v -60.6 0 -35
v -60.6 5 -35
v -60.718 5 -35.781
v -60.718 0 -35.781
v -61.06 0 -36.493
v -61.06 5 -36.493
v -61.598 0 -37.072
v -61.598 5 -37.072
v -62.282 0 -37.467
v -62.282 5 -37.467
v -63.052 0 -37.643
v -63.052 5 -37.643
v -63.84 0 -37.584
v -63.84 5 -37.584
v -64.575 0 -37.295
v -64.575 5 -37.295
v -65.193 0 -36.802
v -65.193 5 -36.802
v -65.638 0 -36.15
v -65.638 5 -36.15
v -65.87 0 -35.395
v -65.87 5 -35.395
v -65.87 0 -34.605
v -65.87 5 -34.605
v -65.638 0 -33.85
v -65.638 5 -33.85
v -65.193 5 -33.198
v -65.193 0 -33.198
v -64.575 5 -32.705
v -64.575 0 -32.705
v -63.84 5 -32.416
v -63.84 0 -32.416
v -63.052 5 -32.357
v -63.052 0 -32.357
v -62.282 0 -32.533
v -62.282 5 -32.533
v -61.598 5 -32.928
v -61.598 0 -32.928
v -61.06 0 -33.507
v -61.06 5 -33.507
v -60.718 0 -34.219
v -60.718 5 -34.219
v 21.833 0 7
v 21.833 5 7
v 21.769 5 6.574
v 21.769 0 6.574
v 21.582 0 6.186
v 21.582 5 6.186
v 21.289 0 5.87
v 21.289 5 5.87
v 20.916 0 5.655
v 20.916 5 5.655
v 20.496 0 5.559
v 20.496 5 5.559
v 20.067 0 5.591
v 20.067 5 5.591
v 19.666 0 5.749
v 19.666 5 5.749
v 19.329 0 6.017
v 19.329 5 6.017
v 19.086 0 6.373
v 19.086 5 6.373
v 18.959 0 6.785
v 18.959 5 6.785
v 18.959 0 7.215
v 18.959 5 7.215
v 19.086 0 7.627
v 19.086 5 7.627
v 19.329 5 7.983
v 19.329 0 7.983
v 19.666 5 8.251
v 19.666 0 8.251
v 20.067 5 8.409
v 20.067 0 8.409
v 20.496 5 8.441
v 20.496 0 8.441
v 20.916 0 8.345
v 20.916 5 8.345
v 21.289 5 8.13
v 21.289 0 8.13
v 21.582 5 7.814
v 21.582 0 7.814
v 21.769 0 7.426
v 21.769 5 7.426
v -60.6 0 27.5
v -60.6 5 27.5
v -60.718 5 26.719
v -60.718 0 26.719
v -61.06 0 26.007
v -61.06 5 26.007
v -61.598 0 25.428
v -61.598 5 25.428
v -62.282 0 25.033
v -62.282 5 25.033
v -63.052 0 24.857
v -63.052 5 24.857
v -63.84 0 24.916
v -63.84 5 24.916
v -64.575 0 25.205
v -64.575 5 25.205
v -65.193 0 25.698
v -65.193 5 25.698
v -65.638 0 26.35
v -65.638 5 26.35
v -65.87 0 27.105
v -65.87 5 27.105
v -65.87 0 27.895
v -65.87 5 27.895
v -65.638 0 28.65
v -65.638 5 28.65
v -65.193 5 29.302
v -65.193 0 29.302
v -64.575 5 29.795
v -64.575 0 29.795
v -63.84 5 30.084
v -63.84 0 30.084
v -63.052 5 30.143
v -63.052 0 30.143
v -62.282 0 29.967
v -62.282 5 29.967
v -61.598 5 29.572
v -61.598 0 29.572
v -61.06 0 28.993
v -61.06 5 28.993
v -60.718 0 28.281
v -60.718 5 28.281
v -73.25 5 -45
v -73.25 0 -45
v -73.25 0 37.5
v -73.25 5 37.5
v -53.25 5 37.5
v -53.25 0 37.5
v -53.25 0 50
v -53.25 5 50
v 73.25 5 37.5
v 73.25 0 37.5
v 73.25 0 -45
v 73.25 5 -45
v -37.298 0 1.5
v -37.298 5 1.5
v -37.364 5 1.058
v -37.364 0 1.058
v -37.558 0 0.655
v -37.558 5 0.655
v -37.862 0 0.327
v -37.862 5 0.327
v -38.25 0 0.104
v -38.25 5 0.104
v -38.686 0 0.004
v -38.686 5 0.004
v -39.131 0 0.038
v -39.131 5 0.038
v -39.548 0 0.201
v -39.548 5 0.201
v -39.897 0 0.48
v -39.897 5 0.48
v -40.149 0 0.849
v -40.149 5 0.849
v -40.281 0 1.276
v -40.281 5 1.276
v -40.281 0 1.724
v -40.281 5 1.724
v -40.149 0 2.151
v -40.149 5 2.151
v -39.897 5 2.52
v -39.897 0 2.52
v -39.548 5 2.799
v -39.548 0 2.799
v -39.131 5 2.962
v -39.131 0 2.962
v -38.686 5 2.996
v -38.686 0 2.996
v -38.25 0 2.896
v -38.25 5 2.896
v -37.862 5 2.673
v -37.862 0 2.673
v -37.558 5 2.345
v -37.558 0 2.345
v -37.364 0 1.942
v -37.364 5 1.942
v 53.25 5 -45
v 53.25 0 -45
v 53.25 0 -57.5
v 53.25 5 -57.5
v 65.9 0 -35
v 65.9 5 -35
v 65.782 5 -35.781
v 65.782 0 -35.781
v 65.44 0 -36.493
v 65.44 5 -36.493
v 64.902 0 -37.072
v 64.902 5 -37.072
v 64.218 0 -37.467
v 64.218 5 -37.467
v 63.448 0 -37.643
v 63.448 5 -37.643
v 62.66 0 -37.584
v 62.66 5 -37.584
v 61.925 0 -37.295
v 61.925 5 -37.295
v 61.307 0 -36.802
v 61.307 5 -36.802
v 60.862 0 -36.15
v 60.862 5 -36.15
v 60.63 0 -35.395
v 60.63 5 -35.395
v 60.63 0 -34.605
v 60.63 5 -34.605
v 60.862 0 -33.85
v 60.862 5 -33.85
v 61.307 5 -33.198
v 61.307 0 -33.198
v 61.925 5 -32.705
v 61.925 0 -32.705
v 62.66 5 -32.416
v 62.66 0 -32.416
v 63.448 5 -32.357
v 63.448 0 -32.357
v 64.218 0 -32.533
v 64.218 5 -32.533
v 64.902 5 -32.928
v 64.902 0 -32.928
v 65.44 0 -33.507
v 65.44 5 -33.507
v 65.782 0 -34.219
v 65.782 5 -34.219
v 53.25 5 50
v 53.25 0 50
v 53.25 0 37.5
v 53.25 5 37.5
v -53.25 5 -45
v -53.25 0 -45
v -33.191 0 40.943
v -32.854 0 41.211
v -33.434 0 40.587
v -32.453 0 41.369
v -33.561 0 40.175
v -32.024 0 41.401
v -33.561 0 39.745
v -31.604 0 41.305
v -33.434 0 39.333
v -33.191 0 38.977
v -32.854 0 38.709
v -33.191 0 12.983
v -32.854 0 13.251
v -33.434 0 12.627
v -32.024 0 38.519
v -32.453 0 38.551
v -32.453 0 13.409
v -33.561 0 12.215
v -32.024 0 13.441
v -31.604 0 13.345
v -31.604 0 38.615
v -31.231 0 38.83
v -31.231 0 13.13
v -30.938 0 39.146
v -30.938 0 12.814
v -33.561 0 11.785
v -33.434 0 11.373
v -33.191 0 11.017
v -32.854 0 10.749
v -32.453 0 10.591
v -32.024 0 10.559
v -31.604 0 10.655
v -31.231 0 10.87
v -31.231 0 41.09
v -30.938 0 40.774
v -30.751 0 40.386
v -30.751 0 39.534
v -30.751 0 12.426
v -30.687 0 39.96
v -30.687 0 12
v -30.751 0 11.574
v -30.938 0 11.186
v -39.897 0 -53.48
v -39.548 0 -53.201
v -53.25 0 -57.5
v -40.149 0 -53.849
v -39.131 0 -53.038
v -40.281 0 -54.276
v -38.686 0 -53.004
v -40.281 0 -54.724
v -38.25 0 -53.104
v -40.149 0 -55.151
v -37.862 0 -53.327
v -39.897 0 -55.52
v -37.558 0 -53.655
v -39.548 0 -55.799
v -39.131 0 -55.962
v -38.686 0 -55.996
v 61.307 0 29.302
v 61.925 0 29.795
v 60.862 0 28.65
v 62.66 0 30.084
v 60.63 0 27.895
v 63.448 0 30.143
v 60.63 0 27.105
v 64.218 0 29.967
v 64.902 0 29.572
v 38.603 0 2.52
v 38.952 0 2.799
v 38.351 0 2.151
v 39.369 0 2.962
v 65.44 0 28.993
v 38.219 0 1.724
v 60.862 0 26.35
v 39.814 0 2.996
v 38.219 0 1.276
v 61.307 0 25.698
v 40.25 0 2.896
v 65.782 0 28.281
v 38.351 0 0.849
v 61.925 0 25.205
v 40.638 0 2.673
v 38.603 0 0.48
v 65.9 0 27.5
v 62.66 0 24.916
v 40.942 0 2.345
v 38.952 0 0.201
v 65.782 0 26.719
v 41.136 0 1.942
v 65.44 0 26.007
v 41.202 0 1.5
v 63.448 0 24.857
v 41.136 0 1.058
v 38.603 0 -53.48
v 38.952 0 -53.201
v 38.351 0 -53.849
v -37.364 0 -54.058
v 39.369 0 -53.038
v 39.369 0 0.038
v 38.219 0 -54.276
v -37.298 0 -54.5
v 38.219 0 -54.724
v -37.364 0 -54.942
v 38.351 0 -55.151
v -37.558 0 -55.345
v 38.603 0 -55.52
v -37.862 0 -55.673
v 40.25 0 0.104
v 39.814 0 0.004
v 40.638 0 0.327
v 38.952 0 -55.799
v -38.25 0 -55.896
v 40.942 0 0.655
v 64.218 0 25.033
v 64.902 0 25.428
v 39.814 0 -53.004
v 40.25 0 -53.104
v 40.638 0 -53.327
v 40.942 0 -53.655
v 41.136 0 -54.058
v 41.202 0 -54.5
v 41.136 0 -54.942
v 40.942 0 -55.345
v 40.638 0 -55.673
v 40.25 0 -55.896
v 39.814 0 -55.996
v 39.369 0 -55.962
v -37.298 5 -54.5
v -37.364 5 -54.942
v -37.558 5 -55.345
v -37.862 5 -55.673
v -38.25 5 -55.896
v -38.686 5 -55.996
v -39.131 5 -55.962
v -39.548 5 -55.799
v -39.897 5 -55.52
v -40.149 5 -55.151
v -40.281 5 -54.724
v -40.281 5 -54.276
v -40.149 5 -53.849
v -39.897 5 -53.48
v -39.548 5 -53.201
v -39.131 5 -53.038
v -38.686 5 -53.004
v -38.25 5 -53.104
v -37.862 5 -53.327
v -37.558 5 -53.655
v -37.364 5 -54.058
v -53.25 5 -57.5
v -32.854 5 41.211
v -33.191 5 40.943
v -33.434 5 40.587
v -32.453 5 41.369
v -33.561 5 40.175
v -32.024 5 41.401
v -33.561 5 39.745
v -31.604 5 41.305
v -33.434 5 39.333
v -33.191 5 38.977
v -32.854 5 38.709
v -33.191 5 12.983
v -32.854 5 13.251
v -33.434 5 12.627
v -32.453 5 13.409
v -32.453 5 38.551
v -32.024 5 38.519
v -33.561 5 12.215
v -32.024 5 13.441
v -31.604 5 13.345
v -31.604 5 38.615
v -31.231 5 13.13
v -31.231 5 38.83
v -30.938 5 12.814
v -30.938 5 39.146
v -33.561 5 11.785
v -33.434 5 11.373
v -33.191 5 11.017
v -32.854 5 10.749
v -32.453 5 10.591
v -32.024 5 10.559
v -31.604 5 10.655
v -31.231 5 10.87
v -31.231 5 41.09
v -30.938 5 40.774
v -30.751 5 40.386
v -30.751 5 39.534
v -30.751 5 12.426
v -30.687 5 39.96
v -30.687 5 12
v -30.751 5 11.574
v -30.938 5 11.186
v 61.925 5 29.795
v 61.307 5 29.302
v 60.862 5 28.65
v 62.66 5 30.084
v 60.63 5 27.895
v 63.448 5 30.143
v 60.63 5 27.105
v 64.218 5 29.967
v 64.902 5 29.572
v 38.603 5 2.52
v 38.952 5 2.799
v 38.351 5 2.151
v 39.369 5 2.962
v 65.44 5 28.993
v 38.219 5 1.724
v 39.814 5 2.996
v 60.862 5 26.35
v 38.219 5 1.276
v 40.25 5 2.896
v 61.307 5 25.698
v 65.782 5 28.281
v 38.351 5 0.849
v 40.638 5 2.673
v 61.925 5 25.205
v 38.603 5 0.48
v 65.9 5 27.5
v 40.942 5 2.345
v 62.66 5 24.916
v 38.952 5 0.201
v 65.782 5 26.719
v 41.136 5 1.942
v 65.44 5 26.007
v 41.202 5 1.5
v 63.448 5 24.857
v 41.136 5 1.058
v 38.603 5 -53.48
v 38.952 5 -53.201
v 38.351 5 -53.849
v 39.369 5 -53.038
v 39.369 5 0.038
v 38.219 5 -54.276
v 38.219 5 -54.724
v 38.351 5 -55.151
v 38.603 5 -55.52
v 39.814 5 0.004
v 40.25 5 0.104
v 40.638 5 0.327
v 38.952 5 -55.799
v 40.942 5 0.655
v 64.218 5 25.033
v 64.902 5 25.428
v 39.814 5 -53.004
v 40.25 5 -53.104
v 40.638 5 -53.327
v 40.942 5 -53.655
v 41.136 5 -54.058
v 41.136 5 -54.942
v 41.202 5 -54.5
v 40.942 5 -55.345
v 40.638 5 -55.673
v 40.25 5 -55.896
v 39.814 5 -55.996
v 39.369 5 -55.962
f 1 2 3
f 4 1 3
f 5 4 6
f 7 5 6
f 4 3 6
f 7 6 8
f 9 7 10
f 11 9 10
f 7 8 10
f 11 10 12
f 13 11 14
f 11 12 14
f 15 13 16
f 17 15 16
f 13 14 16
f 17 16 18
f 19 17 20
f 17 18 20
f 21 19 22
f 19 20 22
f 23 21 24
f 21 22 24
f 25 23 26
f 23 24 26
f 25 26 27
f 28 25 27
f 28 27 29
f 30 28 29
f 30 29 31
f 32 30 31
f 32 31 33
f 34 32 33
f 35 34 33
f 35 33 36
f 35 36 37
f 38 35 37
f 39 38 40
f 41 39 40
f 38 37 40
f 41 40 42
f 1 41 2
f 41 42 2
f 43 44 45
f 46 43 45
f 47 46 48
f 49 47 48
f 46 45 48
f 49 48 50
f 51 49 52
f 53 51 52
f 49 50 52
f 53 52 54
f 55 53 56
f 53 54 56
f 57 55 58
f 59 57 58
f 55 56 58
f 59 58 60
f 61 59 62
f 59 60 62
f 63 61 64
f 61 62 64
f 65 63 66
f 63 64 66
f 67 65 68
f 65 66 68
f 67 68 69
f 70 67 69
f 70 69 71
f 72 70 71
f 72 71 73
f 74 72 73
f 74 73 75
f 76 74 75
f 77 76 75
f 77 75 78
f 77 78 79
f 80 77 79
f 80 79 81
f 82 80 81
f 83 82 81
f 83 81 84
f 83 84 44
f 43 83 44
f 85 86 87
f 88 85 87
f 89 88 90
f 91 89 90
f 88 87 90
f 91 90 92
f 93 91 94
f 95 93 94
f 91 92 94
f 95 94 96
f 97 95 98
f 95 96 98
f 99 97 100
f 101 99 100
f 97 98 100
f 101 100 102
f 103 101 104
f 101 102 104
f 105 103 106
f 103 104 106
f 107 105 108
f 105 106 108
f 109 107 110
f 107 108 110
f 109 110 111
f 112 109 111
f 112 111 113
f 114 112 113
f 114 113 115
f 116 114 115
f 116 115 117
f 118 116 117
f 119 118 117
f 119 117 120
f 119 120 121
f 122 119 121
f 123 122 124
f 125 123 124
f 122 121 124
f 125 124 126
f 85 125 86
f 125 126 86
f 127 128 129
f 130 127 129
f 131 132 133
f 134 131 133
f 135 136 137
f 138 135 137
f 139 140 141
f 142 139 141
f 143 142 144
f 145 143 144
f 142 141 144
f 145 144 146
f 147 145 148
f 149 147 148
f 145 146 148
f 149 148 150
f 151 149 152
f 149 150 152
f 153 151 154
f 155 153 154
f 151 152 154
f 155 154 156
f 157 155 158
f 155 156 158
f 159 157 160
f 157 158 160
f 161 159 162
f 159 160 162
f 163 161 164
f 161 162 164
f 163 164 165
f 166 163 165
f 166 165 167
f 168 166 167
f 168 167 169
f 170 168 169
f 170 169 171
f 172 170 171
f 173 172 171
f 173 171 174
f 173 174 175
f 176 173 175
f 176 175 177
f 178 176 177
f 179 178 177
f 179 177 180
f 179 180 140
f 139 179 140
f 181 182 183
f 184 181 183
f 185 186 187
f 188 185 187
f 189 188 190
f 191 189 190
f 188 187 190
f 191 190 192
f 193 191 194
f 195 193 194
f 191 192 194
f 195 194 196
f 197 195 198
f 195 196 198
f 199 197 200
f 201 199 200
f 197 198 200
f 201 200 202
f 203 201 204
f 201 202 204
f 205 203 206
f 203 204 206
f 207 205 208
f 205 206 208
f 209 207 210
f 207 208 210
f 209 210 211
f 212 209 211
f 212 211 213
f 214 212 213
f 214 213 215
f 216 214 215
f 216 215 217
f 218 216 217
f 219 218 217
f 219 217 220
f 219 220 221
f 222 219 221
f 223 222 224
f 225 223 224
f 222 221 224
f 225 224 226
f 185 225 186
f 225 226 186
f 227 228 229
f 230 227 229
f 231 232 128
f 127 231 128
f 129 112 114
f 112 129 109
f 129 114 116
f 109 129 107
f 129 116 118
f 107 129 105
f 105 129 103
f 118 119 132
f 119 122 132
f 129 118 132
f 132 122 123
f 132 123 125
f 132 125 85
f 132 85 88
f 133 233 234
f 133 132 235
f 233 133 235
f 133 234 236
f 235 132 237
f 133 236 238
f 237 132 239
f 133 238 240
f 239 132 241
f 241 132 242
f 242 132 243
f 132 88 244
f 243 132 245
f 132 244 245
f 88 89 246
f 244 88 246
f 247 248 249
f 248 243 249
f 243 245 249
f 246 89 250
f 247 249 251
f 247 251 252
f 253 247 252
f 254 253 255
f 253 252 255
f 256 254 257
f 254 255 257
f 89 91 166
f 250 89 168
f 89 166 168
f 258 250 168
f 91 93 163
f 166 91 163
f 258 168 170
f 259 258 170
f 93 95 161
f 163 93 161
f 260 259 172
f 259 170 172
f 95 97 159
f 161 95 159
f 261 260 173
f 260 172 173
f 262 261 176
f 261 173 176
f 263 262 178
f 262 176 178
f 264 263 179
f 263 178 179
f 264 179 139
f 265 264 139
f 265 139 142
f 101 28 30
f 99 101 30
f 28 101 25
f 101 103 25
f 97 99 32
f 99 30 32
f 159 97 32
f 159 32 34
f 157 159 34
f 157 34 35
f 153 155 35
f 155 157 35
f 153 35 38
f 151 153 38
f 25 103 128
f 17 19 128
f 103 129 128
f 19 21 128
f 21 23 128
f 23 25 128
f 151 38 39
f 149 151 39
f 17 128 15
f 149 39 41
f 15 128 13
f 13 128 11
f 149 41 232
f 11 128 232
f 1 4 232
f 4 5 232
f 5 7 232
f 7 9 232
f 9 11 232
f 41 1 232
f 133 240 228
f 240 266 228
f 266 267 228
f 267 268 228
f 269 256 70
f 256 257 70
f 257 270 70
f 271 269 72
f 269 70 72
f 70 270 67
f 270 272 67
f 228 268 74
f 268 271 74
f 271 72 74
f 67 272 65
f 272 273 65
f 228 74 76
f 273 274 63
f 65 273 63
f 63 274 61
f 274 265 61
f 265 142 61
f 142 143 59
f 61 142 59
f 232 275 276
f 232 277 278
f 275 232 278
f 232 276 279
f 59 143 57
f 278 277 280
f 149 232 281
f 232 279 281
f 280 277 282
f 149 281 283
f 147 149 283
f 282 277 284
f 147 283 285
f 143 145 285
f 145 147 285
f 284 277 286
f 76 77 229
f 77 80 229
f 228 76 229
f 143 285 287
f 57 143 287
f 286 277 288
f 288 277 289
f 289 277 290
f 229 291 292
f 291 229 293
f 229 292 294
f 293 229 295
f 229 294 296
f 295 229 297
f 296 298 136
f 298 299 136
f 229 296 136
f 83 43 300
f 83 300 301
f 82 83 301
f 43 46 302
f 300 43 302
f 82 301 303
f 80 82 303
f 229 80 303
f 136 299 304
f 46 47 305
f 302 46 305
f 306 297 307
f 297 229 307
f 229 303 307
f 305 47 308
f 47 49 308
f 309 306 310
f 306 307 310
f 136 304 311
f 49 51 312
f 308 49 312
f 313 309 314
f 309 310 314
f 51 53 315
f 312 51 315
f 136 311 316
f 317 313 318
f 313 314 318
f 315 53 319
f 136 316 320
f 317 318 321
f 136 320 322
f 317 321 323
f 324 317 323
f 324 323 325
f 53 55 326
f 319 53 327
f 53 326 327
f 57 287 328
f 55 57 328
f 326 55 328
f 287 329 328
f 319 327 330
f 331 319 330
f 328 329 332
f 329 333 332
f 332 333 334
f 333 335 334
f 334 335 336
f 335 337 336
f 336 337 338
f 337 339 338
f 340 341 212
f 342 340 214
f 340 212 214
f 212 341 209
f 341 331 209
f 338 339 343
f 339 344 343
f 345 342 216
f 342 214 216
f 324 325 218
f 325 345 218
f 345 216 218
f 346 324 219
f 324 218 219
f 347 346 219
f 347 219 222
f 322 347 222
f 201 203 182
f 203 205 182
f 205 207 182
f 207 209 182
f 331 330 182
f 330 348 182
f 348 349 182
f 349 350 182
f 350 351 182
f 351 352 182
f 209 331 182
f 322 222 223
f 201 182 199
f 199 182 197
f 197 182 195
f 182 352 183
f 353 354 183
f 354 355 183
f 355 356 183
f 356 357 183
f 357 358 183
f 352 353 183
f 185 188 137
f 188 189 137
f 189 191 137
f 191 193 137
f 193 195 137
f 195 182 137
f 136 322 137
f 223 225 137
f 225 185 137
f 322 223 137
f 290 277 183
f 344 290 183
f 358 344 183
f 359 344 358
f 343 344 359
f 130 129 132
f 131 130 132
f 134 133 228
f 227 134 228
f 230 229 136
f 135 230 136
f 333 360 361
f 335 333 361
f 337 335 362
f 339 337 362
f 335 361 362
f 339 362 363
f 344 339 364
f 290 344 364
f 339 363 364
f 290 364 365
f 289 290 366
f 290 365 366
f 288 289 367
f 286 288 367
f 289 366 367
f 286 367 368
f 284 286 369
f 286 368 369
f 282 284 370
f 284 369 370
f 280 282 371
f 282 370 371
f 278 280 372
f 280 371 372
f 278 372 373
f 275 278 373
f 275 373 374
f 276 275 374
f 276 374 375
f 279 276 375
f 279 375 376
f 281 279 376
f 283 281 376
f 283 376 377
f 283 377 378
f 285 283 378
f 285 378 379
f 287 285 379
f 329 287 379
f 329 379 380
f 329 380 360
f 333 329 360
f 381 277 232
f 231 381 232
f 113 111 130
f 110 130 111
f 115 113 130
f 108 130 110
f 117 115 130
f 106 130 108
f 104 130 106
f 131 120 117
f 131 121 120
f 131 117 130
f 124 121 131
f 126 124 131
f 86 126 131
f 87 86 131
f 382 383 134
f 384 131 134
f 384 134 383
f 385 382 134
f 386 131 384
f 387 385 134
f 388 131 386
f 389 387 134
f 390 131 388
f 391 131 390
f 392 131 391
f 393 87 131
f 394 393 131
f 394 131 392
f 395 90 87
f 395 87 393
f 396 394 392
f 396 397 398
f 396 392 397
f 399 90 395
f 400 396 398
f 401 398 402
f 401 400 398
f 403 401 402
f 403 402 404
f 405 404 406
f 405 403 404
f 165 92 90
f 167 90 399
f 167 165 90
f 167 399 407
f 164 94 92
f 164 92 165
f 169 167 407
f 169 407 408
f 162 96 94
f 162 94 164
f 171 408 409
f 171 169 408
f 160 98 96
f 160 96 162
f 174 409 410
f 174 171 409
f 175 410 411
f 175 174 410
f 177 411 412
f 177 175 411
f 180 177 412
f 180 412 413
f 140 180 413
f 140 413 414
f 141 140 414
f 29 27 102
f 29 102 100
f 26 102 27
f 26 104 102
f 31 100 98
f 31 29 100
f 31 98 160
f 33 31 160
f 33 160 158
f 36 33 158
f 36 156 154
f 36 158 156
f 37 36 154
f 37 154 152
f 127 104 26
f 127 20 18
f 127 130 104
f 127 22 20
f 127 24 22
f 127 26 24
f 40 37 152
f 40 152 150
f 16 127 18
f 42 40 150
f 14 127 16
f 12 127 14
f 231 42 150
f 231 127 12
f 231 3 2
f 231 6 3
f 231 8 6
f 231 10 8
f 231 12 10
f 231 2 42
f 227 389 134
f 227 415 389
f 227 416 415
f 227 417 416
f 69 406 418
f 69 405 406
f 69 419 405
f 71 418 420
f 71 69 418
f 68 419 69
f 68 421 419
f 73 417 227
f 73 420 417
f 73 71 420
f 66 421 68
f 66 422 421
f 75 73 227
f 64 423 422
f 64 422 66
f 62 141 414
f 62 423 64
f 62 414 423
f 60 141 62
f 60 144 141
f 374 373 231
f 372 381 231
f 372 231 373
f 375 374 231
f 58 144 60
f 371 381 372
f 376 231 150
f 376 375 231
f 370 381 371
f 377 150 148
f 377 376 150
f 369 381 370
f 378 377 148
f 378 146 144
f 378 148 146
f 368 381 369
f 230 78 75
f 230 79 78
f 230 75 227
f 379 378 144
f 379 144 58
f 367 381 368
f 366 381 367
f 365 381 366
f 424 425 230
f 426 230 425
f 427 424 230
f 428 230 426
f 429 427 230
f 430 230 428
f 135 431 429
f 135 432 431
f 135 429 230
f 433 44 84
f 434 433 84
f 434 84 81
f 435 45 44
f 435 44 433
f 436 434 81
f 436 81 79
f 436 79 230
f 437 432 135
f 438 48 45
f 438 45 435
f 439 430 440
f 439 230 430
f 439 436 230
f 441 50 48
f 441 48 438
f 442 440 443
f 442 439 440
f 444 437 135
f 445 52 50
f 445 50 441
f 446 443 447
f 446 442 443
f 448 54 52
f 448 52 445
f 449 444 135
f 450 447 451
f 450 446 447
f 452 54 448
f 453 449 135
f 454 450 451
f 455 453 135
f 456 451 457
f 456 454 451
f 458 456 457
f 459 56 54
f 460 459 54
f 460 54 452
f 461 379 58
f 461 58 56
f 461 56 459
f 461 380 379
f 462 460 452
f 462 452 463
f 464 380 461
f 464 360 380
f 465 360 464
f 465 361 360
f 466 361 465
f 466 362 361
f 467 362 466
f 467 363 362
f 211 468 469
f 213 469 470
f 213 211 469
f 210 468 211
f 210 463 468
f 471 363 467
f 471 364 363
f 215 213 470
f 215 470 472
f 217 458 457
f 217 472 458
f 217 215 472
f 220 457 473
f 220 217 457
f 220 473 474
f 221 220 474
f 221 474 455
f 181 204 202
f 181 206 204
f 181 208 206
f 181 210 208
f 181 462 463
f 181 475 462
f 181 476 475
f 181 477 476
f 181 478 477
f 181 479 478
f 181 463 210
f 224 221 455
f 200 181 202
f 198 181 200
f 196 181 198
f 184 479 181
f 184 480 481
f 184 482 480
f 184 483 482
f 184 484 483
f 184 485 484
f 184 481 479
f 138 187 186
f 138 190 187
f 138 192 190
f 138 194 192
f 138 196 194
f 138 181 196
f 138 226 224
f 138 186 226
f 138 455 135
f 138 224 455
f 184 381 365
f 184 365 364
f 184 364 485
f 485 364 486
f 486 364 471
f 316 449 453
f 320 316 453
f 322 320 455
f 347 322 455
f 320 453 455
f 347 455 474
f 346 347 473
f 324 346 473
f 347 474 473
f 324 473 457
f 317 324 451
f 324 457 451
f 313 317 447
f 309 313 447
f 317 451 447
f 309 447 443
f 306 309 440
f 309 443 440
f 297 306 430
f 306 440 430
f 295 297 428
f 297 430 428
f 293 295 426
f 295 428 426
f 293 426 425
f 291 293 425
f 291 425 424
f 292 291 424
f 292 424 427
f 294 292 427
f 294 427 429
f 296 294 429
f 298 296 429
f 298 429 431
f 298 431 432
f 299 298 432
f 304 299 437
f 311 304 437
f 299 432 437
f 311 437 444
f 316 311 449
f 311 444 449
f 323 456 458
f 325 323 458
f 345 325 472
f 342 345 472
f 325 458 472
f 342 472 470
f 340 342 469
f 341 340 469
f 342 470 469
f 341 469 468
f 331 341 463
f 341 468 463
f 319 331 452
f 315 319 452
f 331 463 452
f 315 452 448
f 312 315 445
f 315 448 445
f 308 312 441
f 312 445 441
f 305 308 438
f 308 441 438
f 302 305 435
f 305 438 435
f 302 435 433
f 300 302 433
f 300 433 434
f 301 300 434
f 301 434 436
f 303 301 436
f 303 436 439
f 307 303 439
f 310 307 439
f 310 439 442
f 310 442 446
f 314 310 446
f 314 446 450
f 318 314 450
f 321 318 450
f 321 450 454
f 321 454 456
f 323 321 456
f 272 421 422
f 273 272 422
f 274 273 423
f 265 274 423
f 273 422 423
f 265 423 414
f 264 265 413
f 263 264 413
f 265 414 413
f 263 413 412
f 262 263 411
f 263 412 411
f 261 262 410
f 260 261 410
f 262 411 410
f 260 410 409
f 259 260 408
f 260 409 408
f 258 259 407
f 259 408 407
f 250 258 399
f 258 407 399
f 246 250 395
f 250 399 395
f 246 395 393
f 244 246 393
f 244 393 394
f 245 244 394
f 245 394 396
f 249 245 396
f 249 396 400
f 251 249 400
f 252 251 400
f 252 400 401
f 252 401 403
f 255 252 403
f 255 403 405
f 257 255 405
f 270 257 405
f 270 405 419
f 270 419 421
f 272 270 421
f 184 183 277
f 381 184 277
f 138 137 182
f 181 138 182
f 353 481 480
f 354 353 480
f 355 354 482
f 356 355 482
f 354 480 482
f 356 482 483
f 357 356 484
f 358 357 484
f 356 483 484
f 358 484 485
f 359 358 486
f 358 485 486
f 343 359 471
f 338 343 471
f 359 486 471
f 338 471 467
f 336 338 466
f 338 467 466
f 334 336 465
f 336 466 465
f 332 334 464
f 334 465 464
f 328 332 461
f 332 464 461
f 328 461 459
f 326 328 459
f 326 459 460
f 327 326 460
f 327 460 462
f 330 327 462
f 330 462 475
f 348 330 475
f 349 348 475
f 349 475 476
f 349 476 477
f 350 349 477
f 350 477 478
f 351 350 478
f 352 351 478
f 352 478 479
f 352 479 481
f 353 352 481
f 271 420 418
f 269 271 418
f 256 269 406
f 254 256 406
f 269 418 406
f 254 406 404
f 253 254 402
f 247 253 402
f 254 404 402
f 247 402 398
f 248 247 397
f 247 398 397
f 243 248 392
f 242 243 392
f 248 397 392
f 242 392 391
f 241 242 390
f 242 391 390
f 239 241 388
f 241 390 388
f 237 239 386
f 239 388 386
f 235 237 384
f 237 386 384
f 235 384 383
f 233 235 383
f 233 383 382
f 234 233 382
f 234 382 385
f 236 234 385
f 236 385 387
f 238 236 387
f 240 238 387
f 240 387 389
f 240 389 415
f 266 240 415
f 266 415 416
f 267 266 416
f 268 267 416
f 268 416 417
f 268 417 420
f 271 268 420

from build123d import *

# Parameters (mm, degrees)
SALIENTE_EXTRUIR1_DEPTH = 5
CROQUIS2_R              = 2.65
CORTAR_EXTRUIR1_DEPTH   = 5
CROQUIS5_R              = 1.5
CROQUIS5_R_2            = 1.445
CORTAR_EXTRUIR2_DEPTH   = 10


with BuildPart() as part:
    # Croquis1 → Saliente-Extruir1 (new body)
    with BuildSketch(Plane(origin=(0, 0, 0), x_dir=(1, 0, 0), z_dir=(0, 1, 0))):
        Polygon((53.25, -50), (53.25, -37.5), (73.25, -37.5), (73.25, 45), (53.25, 45), (53.25, 57.5), (-53.25, 57.5), (-53.25, 45), (-73.25, 45), (-73.25, -37.5), (-53.25, -37.5), (-53.25, -50), align=None)
    extrude(amount=SALIENTE_EXTRUIR1_DEPTH)

    # Croquis2 → Cortar-Extruir1 (cut)
    with BuildSketch(Plane(origin=(0, 5, 0), x_dir=(1, 0, 0), z_dir=(0, 1, 0))):
        with Locations((-63.25, 35)):
            Circle(CROQUIS2_R)
        with Locations((-63.25, -27.5)):
            Circle(CROQUIS2_R)
        with Locations((63.25, 35)):
            Circle(CROQUIS2_R)
        with Locations((63.25, -27.5)):
            Circle(CROQUIS2_R)
    extrude(amount=-CORTAR_EXTRUIR1_DEPTH, mode=Mode.SUBTRACT)

    # Croquis5 → Cortar-Extruir2 (cut)
    with BuildSketch(Plane(origin=(0, 5, 0), x_dir=(1, 0, 0), z_dir=(0, 1, 0))):
        with Locations((-38.797689263, 54.5)):
            Circle(CROQUIS5_R)
        with Locations((39.702310737, 54.5)):
            Circle(CROQUIS5_R)
        with Locations((-38.797689263, -1.5)):
            Circle(CROQUIS5_R)
        with Locations((39.702310737, -1.5)):
            Circle(CROQUIS5_R)
        with Locations((-32.131872623, -39.96)):
            Circle(CROQUIS5_R_2)
        with Locations((-32.131872623, -12)):
            Circle(CROQUIS5_R_2)
        with Locations((20.388127377, -7)):
            Circle(CROQUIS5_R_2)
    extrude(amount=-CORTAR_EXTRUIR2_DEPTH, mode=Mode.SUBTRACT)


solid = part.part
